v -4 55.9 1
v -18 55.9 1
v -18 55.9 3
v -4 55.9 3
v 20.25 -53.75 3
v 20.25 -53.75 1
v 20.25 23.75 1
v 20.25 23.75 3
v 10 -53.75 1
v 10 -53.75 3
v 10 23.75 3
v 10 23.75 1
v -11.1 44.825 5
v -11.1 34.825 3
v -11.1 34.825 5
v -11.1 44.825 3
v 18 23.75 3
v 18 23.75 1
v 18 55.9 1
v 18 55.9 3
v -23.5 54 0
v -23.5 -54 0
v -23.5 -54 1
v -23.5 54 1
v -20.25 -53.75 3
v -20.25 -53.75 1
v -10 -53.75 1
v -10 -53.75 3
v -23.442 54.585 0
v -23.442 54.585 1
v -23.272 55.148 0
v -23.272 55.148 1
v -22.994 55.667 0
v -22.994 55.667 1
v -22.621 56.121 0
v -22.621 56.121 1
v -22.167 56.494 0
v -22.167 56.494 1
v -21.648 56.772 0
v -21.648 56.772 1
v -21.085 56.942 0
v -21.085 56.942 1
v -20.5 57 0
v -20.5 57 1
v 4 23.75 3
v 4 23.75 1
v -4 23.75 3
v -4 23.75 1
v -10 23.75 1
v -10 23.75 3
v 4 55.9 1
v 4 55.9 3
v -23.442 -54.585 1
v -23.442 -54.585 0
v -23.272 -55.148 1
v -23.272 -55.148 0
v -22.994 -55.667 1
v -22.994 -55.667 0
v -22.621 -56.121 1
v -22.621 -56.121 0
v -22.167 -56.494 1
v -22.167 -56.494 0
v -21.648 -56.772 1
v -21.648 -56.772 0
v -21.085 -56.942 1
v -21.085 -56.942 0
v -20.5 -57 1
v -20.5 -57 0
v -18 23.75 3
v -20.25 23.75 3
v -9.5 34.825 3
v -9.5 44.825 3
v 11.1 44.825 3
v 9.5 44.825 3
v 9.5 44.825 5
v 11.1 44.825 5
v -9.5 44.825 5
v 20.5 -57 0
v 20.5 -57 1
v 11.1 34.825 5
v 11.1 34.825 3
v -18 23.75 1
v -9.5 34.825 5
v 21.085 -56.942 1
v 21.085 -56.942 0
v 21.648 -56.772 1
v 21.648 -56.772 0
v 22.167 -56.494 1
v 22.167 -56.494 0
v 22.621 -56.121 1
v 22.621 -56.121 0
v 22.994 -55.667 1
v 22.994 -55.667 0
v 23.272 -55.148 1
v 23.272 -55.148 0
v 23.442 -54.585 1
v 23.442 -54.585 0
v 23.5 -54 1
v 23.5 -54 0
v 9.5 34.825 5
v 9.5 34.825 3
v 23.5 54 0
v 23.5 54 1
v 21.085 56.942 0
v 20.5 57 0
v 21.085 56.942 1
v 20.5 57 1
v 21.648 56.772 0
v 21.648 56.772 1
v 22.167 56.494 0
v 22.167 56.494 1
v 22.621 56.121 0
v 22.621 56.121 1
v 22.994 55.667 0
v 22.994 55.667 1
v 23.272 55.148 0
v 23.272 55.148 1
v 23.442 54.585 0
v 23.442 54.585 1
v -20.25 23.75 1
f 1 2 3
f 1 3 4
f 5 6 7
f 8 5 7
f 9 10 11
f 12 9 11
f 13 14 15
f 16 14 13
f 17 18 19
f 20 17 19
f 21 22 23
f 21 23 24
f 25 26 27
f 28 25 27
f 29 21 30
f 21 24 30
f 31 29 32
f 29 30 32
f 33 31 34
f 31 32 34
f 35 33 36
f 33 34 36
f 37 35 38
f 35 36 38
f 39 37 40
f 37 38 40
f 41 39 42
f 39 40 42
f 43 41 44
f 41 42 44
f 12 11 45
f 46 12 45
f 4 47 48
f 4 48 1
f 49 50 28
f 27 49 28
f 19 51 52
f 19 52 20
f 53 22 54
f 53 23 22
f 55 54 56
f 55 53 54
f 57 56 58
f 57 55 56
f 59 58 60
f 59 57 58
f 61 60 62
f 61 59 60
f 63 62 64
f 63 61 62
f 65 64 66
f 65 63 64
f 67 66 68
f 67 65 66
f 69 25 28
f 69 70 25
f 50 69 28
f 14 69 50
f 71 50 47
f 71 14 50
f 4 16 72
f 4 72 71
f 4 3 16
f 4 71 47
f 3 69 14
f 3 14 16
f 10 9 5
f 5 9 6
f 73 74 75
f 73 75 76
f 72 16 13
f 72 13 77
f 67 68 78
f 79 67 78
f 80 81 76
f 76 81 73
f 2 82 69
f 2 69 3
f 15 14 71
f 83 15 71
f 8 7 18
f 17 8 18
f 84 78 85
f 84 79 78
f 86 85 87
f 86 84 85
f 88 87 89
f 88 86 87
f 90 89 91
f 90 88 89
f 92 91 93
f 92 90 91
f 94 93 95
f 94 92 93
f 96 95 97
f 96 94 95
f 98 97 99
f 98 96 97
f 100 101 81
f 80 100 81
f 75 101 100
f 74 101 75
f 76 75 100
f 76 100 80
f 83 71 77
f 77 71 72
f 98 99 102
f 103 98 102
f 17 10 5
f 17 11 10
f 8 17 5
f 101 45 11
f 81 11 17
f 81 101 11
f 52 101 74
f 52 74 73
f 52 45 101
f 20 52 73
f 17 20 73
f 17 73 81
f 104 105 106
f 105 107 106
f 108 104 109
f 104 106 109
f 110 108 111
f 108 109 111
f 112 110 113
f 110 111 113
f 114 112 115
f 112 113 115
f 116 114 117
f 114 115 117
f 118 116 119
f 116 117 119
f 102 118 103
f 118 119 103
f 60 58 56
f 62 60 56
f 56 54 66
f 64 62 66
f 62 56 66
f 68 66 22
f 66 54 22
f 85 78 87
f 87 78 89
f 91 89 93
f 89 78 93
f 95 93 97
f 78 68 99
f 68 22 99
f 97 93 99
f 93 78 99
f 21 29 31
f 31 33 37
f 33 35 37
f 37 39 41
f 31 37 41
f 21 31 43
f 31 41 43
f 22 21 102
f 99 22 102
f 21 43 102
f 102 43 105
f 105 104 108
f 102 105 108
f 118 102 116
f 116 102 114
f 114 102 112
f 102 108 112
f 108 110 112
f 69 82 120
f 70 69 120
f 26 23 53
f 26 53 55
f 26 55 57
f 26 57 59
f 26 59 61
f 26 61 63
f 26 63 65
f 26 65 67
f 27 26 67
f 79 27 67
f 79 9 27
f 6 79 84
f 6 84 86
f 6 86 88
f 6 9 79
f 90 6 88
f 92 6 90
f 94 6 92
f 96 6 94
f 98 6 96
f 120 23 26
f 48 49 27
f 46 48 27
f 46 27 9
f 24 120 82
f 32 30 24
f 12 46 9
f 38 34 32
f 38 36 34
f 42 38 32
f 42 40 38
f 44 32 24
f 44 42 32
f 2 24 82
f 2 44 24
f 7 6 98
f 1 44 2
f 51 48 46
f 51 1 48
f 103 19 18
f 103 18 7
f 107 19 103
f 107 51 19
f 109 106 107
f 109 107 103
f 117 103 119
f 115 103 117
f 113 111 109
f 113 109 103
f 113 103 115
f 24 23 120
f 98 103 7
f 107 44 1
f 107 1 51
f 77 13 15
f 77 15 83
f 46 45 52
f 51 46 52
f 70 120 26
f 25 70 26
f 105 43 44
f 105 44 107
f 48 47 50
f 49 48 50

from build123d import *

# Parameters (mm, degrees)
F0_W     = 47
F0_H     = 114
F1_DEPTH = 1
F0_W_2   = 36
F0_H_2   = 32.15
F2_DEPTH = 3
F3_R     = 3
F4_W     = 8
F4_H     = 32.15
F5_DEPTH = 2
F4_W_2   = 1.6
F4_H_2   = 10
F6_DEPTH = 2


with BuildPart() as f1:
    # F0 (on Top) → F1 (new body)
    with BuildSketch(Plane.XY):
        Rectangle(F0_W, F0_H)
        Polygon((18, 23.75), (20.25, 23.75), (20.25, -53.75), (-20.25, -53.75), (-20.25, 23.75), (-18, 23.75), (-18, 55.9), (18, 55.9), align=None, mode=Mode.SUBTRACT)
    extrude(amount=F1_DEPTH)

    # F0 (on Top) → F2 (join)
    with BuildSketch(Plane.XY):
        Polygon((20.25, -53.75), (20.25, 23.75), (18, 23.75), (-18, 23.75), (-20.25, 23.75), (-20.25, -53.75), align=None)
        with Locations((0, 39.825)):
            Rectangle(F0_W_2, F0_H_2)
    extrude(amount=F2_DEPTH)

    # F3
    f3_edges = [f1.edges().sort_by_distance(p)[0] for p in [
        (23.5, -57, 0.5),
        (-23.5, -57, 0.5),
        (23.5, 57, 0.5),
        (-23.5, 57, 0.5),
    ]]
    fillet(f3_edges, radius=F3_R)

    # F4 (on face) → F5 (cut)
    with BuildSketch(Plane.XY.offset(3)):
        Polygon((-10, -53.75), (10, -53.75), (10, 23.75), (4, 23.75), (-4, 23.75), (-10, 23.75), align=None)
        with Locations((0, 39.825)):
            Rectangle(F4_W, F4_H)
    extrude(amount=-F5_DEPTH, mode=Mode.SUBTRACT)

    # F4 (on face) → F6 (join)
    with BuildSketch(Plane.XY.offset(3)):
        with Locations((-10.3, 39.825)):
            Rectangle(F4_W_2, F4_H_2)
        with Locations((10.3, 39.825)):
            Rectangle(F4_W_2, F4_H_2)
    extrude(amount=F6_DEPTH)


solid = f1.part
